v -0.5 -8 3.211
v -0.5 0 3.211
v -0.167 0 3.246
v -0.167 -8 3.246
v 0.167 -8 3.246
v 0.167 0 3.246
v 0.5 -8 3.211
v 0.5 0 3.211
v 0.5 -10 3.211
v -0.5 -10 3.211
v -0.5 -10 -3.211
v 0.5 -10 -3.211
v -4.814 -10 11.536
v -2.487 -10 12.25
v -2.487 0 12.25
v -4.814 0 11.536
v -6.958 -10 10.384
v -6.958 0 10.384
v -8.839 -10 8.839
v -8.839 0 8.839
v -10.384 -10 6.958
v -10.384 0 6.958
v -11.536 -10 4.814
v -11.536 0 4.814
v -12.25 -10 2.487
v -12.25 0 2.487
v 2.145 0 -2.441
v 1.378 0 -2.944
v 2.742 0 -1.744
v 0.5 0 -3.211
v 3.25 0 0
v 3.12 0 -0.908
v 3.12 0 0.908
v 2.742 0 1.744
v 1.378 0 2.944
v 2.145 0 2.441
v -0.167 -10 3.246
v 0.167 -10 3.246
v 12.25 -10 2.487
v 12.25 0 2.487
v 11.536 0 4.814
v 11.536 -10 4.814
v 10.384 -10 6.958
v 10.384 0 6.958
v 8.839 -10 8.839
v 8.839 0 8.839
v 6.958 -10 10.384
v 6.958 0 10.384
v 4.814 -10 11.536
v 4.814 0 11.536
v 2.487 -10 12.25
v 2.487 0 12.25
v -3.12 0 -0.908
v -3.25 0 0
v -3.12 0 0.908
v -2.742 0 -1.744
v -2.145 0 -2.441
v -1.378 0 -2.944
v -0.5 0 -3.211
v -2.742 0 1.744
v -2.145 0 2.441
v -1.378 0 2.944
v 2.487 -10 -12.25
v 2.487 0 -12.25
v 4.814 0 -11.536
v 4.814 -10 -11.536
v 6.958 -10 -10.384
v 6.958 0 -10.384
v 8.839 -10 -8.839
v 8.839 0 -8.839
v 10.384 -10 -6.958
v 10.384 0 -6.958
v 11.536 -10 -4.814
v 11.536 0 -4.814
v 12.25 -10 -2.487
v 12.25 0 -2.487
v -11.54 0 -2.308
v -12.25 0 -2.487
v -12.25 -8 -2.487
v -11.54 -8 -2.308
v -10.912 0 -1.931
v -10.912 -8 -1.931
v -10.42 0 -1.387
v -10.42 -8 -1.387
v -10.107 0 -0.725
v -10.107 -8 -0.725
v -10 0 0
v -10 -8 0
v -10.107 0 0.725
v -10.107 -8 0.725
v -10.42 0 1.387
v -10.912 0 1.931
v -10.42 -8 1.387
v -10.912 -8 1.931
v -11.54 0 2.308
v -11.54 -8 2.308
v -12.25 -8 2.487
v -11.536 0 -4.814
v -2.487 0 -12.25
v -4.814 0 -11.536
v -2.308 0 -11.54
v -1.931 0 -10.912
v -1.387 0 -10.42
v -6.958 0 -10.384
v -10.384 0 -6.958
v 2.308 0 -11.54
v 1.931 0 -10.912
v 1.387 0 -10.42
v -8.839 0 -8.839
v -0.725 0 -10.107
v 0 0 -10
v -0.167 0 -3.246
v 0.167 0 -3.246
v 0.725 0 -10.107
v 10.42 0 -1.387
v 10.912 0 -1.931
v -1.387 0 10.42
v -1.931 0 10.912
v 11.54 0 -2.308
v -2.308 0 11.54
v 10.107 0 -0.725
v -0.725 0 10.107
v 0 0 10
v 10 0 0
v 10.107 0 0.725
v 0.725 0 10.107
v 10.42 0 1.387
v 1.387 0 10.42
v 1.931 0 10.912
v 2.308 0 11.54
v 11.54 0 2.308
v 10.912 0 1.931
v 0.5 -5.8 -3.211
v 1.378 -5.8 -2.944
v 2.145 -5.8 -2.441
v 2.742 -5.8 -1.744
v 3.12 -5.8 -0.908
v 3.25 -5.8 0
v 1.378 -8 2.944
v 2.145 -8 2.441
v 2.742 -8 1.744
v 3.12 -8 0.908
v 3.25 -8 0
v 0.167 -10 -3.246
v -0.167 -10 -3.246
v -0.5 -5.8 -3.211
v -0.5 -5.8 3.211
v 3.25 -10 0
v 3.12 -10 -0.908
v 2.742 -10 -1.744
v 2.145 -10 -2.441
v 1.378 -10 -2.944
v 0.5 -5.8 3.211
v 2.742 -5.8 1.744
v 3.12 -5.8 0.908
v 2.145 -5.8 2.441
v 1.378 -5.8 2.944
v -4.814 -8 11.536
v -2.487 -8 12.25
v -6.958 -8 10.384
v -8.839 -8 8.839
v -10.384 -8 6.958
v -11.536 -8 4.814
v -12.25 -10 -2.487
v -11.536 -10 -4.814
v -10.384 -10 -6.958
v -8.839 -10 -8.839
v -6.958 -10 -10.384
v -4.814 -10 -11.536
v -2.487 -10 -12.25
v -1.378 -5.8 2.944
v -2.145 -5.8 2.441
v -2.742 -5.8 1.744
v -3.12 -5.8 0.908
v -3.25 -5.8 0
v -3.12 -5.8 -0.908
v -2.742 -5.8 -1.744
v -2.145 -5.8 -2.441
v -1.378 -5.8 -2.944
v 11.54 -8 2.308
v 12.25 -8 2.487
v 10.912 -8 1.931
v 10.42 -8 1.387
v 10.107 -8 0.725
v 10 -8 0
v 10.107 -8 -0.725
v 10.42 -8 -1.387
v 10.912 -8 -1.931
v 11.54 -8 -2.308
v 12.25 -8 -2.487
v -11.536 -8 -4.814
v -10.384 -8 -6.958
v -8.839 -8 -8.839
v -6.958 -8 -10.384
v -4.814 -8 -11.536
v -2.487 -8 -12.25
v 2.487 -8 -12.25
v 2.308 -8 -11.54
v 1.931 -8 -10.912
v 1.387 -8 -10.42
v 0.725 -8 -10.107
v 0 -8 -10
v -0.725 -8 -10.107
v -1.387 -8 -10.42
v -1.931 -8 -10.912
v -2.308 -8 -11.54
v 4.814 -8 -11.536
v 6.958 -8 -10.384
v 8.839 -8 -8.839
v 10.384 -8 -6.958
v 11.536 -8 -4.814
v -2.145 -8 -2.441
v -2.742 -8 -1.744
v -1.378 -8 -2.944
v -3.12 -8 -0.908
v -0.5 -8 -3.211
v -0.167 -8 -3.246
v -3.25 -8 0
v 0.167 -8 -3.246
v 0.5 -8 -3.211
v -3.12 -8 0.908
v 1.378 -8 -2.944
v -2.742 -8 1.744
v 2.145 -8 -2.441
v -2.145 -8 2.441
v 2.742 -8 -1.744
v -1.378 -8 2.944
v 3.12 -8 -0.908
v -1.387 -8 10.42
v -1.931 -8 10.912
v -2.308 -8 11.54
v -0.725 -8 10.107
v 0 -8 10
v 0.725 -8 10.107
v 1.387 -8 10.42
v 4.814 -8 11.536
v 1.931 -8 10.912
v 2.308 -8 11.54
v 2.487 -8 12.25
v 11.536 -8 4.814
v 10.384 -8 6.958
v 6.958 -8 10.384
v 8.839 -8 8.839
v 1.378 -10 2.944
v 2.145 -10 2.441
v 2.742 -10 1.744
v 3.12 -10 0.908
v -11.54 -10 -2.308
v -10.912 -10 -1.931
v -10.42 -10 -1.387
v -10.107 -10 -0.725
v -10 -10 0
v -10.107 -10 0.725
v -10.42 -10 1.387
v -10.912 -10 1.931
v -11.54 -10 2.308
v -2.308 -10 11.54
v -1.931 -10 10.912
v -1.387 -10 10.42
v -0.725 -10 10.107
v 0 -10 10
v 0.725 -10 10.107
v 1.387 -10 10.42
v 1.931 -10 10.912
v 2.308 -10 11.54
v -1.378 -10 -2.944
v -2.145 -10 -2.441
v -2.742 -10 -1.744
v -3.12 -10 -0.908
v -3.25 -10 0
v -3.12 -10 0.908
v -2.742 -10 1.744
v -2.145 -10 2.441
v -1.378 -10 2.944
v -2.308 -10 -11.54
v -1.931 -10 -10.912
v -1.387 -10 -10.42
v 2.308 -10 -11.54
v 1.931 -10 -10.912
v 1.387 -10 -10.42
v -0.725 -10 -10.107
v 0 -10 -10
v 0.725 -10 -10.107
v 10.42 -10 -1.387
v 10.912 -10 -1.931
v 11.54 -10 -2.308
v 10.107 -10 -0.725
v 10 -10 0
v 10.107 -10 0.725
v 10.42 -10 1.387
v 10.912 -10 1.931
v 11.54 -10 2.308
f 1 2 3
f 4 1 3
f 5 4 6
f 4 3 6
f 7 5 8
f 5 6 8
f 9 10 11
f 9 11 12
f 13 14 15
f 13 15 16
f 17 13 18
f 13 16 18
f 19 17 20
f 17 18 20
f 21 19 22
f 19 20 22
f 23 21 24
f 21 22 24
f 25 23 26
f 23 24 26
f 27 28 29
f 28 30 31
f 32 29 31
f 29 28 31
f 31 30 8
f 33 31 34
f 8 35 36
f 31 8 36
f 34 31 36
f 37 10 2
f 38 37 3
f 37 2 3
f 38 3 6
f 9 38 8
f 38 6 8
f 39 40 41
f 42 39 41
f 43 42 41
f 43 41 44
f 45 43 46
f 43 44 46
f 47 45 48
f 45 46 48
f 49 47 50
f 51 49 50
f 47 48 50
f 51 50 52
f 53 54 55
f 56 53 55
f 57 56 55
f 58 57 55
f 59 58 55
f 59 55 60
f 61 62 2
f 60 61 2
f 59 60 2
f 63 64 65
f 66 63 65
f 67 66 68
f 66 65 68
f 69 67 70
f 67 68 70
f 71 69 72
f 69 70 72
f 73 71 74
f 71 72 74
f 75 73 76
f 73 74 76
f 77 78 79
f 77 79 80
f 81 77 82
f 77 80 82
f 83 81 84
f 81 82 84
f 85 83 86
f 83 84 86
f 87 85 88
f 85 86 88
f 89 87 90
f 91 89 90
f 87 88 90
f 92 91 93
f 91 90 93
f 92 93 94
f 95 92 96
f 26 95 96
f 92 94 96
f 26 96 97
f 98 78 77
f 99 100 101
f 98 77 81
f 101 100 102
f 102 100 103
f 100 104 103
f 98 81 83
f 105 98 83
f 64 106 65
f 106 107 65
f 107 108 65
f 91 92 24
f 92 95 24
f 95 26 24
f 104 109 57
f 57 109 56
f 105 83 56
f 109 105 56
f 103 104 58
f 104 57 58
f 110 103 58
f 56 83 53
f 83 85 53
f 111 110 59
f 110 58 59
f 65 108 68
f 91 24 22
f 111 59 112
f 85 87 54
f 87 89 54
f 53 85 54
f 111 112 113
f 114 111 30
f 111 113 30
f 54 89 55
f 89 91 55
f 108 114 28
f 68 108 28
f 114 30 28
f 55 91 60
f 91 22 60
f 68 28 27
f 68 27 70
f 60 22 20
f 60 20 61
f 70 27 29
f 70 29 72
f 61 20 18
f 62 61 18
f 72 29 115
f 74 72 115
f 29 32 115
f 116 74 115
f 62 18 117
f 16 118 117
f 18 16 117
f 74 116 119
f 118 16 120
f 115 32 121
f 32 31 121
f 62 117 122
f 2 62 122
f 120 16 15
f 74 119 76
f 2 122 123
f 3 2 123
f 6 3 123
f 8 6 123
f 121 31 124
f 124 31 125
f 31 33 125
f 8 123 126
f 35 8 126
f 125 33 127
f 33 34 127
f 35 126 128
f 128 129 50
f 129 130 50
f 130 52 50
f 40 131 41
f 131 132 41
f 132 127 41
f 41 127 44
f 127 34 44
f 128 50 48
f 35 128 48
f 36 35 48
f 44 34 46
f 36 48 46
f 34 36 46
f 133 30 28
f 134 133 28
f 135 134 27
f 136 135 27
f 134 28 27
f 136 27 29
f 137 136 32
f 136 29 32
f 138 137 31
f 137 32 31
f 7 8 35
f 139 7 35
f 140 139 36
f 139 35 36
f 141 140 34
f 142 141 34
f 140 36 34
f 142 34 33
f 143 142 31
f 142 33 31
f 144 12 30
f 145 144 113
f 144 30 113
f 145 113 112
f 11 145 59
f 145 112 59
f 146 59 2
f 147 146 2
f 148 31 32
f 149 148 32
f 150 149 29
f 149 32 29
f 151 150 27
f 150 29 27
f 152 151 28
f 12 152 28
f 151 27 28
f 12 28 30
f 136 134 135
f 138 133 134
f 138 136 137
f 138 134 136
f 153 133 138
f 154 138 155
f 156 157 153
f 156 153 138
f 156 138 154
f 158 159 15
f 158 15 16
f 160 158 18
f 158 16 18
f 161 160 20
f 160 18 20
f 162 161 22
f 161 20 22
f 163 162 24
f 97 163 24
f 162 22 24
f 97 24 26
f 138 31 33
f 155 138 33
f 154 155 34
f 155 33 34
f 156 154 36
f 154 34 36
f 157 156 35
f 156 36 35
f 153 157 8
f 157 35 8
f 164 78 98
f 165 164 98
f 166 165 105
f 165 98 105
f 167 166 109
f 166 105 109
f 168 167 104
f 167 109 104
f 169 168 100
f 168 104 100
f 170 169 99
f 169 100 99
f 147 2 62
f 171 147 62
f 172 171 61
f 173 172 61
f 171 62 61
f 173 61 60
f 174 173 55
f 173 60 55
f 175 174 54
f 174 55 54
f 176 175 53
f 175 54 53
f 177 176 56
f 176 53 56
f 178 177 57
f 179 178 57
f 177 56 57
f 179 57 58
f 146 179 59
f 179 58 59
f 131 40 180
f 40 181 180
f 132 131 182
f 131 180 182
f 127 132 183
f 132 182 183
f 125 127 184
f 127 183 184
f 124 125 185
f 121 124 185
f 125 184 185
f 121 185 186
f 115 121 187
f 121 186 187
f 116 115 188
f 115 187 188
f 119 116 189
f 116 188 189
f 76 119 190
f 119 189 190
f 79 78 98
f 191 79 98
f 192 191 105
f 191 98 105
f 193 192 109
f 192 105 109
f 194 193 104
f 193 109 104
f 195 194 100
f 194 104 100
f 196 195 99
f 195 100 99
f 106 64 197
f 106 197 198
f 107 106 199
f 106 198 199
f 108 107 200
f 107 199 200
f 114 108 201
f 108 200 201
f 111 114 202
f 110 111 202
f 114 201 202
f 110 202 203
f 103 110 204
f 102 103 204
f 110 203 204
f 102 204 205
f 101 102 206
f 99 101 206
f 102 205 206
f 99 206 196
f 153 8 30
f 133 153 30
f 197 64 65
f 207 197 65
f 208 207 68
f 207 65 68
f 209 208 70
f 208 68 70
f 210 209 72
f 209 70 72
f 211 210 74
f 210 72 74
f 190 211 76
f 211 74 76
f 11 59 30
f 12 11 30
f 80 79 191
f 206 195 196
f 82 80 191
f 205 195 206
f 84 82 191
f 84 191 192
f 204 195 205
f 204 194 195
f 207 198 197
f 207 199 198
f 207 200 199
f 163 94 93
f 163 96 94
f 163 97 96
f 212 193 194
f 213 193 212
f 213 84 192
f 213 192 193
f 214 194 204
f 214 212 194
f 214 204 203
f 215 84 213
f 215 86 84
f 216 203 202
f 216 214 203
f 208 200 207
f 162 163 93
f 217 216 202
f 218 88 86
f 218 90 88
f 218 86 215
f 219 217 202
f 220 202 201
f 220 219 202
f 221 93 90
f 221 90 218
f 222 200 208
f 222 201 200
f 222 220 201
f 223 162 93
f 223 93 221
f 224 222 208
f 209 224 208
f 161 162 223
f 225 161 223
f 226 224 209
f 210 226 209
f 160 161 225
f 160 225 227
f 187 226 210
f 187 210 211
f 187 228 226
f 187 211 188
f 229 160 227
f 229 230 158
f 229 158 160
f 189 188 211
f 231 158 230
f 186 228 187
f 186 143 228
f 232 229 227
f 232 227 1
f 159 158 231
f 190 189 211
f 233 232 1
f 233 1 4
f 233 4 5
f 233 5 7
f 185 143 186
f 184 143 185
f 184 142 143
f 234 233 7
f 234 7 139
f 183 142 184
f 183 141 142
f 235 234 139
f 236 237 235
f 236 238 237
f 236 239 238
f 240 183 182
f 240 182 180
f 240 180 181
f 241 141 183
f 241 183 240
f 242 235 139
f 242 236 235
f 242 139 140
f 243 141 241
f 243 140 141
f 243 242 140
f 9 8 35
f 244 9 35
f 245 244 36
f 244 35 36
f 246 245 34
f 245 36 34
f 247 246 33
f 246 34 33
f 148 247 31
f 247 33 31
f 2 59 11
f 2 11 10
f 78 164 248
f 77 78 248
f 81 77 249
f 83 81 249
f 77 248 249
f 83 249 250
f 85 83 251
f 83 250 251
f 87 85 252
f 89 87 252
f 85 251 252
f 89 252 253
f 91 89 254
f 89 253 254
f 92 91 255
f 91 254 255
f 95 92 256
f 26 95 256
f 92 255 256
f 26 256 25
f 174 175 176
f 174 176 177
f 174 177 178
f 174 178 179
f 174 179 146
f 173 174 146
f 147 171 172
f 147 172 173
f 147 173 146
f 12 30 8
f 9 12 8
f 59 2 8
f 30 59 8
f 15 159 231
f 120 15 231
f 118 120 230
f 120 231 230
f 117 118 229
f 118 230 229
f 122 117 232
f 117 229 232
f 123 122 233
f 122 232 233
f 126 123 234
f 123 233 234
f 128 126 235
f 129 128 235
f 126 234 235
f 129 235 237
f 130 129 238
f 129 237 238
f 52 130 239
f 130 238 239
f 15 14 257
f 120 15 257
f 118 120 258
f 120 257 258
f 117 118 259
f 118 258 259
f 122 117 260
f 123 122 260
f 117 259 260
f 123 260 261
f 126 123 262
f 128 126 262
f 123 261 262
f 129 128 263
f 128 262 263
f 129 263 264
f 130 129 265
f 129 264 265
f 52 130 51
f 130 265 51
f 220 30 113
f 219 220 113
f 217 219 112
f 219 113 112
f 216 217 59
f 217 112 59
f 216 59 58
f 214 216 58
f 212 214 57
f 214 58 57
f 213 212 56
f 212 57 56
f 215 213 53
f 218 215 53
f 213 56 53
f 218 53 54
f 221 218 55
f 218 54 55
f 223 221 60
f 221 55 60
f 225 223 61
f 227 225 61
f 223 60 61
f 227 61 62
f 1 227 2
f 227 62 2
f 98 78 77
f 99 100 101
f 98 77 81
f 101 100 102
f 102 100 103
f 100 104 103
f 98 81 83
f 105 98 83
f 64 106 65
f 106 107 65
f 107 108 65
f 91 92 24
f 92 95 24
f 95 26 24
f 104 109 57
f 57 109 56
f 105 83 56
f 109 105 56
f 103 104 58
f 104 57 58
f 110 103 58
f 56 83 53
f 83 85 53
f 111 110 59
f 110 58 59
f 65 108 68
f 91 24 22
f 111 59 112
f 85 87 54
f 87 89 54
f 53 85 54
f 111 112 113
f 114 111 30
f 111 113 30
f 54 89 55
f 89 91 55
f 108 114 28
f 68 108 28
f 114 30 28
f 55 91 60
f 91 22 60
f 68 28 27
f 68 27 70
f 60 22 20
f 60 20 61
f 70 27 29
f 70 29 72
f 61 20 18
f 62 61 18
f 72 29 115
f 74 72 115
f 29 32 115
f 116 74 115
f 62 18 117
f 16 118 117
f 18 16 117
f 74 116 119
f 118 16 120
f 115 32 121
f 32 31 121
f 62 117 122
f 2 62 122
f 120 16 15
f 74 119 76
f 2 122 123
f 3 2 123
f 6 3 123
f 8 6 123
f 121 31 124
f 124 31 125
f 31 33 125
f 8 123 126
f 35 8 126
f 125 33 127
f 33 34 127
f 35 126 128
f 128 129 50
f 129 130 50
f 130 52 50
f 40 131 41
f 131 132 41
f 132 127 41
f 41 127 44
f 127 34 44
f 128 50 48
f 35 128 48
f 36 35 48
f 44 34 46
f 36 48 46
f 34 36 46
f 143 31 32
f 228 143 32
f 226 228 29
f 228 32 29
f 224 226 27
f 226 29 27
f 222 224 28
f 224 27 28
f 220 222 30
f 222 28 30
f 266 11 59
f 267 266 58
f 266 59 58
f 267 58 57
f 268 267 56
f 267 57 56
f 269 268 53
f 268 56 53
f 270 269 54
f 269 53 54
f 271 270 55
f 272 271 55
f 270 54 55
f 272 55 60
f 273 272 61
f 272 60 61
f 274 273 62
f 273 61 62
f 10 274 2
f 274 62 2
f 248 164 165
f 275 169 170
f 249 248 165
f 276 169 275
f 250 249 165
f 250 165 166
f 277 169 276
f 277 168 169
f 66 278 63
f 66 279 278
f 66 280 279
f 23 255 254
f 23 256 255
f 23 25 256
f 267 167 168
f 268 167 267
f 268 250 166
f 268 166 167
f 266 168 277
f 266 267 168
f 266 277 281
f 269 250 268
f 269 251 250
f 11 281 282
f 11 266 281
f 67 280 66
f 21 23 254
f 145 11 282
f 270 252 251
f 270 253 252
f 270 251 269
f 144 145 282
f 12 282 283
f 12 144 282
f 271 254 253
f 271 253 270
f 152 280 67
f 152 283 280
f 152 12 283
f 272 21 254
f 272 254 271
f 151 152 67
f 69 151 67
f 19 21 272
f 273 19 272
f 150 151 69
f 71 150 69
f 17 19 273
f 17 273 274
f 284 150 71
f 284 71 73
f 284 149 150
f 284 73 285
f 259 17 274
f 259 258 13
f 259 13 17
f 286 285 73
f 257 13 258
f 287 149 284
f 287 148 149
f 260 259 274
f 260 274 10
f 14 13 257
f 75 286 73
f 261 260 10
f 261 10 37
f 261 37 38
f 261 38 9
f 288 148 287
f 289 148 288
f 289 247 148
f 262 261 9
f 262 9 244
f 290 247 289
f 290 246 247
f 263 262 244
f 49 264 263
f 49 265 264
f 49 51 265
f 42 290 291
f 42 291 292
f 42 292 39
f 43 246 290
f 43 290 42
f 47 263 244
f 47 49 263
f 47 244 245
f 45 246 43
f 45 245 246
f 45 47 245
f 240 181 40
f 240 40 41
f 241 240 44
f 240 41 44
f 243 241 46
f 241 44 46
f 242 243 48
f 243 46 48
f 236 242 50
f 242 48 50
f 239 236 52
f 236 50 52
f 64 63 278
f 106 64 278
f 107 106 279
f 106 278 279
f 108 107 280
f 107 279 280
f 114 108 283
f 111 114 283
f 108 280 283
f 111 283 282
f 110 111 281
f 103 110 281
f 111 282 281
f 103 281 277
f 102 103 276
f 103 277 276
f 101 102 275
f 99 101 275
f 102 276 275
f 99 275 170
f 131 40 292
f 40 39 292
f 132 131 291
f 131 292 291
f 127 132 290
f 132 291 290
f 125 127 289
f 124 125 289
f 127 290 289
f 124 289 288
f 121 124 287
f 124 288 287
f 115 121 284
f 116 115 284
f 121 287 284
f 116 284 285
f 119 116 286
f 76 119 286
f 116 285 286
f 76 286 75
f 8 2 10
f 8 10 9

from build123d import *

# Parameters (mm, degrees)
F0_R     = 12.5
F0_W     = 1
F0_H     = 6.422616
F1_DEPTH = 10
F2_DEPTH = 5.8
F3_D     = 5
F4_DEPTH = 8
F5_D     = 5


with BuildPart() as f1:
    # F0 (on Front) → F1 (new body)
    with BuildSketch(Plane.XZ):
        Circle(F0_R)
        with BuildLine():
            ThreePointArc((0.5, 3.211308), (2.468552, 2.113942), (3.25, 0))
            ThreePointArc((3.25, 0), (2.468552, -2.113942), (0.5, -3.211308))
            ThreePointArc((0.5, -3.211308), (0, -3.25), (-0.5, -3.211308))
            ThreePointArc((-0.5, -3.211308), (-3.25, 0), (-0.5, 3.211308))
            ThreePointArc((-0.5, 3.211308), (0, 3.25), (0.5, 3.211308))
        make_face(mode=Mode.SUBTRACT)
        Rectangle(F0_W, F0_H)
    extrude(amount=F1_DEPTH)

    # F3 (through all)
    with Locations(Plane(origin=(0, 0, 0), x_dir=(1, 0, 0), z_dir=(0, 1, 0))):
        with Locations((0, 12.5), (12.5, 0), (-12.5, 0), (0, -12.5)):
            Hole(F3_D / 2)


with BuildPart() as f2:
    # F0 (on Front) → F2 (new body)
    with BuildSketch(Plane.XZ):
        with BuildLine():
            ThreePointArc((0.5, -3.211308), (2.468552, -2.113942), (3.25, 0))
            ThreePointArc((3.25, 0), (2.468552, 2.113942), (0.5, 3.211308))
            Line((0.5, 3.211308), (0.5, -3.211308))
        make_face()
        with BuildLine():
            Line((-0.5, -3.211308), (-0.5, 3.211308))
            ThreePointArc((-0.5, 3.211308), (-3.25, 0), (-0.5, -3.211308))
        make_face()
    extrude(amount=F2_DEPTH)


with BuildPart() as f4:
    # F0 (on Front) → F4 (new body)
    with BuildSketch(Plane.XZ):
        Circle(F0_R)
        with BuildLine():
            ThreePointArc((0.5, 3.211308), (2.468552, 2.113942), (3.25, 0))
            ThreePointArc((3.25, 0), (2.468552, -2.113942), (0.5, -3.211308))
            ThreePointArc((0.5, -3.211308), (0, -3.25), (-0.5, -3.211308))
            ThreePointArc((-0.5, -3.211308), (-3.25, 0), (-0.5, 3.211308))
            ThreePointArc((-0.5, 3.211308), (0, 3.25), (0.5, 3.211308))
        make_face(mode=Mode.SUBTRACT)
    extrude(amount=F4_DEPTH)

    # F5 (through all)
    with Locations(Plane(origin=(0, 0, 0), x_dir=(1, 0, 0), z_dir=(0, 1, 0))):
        with Locations((0, 12.5), (12.5, 0), (-12.5, 0), (0, -12.5)):
            Hole(F5_D / 2)


solid = Compound([f1.part, f2.part, f4.part])
